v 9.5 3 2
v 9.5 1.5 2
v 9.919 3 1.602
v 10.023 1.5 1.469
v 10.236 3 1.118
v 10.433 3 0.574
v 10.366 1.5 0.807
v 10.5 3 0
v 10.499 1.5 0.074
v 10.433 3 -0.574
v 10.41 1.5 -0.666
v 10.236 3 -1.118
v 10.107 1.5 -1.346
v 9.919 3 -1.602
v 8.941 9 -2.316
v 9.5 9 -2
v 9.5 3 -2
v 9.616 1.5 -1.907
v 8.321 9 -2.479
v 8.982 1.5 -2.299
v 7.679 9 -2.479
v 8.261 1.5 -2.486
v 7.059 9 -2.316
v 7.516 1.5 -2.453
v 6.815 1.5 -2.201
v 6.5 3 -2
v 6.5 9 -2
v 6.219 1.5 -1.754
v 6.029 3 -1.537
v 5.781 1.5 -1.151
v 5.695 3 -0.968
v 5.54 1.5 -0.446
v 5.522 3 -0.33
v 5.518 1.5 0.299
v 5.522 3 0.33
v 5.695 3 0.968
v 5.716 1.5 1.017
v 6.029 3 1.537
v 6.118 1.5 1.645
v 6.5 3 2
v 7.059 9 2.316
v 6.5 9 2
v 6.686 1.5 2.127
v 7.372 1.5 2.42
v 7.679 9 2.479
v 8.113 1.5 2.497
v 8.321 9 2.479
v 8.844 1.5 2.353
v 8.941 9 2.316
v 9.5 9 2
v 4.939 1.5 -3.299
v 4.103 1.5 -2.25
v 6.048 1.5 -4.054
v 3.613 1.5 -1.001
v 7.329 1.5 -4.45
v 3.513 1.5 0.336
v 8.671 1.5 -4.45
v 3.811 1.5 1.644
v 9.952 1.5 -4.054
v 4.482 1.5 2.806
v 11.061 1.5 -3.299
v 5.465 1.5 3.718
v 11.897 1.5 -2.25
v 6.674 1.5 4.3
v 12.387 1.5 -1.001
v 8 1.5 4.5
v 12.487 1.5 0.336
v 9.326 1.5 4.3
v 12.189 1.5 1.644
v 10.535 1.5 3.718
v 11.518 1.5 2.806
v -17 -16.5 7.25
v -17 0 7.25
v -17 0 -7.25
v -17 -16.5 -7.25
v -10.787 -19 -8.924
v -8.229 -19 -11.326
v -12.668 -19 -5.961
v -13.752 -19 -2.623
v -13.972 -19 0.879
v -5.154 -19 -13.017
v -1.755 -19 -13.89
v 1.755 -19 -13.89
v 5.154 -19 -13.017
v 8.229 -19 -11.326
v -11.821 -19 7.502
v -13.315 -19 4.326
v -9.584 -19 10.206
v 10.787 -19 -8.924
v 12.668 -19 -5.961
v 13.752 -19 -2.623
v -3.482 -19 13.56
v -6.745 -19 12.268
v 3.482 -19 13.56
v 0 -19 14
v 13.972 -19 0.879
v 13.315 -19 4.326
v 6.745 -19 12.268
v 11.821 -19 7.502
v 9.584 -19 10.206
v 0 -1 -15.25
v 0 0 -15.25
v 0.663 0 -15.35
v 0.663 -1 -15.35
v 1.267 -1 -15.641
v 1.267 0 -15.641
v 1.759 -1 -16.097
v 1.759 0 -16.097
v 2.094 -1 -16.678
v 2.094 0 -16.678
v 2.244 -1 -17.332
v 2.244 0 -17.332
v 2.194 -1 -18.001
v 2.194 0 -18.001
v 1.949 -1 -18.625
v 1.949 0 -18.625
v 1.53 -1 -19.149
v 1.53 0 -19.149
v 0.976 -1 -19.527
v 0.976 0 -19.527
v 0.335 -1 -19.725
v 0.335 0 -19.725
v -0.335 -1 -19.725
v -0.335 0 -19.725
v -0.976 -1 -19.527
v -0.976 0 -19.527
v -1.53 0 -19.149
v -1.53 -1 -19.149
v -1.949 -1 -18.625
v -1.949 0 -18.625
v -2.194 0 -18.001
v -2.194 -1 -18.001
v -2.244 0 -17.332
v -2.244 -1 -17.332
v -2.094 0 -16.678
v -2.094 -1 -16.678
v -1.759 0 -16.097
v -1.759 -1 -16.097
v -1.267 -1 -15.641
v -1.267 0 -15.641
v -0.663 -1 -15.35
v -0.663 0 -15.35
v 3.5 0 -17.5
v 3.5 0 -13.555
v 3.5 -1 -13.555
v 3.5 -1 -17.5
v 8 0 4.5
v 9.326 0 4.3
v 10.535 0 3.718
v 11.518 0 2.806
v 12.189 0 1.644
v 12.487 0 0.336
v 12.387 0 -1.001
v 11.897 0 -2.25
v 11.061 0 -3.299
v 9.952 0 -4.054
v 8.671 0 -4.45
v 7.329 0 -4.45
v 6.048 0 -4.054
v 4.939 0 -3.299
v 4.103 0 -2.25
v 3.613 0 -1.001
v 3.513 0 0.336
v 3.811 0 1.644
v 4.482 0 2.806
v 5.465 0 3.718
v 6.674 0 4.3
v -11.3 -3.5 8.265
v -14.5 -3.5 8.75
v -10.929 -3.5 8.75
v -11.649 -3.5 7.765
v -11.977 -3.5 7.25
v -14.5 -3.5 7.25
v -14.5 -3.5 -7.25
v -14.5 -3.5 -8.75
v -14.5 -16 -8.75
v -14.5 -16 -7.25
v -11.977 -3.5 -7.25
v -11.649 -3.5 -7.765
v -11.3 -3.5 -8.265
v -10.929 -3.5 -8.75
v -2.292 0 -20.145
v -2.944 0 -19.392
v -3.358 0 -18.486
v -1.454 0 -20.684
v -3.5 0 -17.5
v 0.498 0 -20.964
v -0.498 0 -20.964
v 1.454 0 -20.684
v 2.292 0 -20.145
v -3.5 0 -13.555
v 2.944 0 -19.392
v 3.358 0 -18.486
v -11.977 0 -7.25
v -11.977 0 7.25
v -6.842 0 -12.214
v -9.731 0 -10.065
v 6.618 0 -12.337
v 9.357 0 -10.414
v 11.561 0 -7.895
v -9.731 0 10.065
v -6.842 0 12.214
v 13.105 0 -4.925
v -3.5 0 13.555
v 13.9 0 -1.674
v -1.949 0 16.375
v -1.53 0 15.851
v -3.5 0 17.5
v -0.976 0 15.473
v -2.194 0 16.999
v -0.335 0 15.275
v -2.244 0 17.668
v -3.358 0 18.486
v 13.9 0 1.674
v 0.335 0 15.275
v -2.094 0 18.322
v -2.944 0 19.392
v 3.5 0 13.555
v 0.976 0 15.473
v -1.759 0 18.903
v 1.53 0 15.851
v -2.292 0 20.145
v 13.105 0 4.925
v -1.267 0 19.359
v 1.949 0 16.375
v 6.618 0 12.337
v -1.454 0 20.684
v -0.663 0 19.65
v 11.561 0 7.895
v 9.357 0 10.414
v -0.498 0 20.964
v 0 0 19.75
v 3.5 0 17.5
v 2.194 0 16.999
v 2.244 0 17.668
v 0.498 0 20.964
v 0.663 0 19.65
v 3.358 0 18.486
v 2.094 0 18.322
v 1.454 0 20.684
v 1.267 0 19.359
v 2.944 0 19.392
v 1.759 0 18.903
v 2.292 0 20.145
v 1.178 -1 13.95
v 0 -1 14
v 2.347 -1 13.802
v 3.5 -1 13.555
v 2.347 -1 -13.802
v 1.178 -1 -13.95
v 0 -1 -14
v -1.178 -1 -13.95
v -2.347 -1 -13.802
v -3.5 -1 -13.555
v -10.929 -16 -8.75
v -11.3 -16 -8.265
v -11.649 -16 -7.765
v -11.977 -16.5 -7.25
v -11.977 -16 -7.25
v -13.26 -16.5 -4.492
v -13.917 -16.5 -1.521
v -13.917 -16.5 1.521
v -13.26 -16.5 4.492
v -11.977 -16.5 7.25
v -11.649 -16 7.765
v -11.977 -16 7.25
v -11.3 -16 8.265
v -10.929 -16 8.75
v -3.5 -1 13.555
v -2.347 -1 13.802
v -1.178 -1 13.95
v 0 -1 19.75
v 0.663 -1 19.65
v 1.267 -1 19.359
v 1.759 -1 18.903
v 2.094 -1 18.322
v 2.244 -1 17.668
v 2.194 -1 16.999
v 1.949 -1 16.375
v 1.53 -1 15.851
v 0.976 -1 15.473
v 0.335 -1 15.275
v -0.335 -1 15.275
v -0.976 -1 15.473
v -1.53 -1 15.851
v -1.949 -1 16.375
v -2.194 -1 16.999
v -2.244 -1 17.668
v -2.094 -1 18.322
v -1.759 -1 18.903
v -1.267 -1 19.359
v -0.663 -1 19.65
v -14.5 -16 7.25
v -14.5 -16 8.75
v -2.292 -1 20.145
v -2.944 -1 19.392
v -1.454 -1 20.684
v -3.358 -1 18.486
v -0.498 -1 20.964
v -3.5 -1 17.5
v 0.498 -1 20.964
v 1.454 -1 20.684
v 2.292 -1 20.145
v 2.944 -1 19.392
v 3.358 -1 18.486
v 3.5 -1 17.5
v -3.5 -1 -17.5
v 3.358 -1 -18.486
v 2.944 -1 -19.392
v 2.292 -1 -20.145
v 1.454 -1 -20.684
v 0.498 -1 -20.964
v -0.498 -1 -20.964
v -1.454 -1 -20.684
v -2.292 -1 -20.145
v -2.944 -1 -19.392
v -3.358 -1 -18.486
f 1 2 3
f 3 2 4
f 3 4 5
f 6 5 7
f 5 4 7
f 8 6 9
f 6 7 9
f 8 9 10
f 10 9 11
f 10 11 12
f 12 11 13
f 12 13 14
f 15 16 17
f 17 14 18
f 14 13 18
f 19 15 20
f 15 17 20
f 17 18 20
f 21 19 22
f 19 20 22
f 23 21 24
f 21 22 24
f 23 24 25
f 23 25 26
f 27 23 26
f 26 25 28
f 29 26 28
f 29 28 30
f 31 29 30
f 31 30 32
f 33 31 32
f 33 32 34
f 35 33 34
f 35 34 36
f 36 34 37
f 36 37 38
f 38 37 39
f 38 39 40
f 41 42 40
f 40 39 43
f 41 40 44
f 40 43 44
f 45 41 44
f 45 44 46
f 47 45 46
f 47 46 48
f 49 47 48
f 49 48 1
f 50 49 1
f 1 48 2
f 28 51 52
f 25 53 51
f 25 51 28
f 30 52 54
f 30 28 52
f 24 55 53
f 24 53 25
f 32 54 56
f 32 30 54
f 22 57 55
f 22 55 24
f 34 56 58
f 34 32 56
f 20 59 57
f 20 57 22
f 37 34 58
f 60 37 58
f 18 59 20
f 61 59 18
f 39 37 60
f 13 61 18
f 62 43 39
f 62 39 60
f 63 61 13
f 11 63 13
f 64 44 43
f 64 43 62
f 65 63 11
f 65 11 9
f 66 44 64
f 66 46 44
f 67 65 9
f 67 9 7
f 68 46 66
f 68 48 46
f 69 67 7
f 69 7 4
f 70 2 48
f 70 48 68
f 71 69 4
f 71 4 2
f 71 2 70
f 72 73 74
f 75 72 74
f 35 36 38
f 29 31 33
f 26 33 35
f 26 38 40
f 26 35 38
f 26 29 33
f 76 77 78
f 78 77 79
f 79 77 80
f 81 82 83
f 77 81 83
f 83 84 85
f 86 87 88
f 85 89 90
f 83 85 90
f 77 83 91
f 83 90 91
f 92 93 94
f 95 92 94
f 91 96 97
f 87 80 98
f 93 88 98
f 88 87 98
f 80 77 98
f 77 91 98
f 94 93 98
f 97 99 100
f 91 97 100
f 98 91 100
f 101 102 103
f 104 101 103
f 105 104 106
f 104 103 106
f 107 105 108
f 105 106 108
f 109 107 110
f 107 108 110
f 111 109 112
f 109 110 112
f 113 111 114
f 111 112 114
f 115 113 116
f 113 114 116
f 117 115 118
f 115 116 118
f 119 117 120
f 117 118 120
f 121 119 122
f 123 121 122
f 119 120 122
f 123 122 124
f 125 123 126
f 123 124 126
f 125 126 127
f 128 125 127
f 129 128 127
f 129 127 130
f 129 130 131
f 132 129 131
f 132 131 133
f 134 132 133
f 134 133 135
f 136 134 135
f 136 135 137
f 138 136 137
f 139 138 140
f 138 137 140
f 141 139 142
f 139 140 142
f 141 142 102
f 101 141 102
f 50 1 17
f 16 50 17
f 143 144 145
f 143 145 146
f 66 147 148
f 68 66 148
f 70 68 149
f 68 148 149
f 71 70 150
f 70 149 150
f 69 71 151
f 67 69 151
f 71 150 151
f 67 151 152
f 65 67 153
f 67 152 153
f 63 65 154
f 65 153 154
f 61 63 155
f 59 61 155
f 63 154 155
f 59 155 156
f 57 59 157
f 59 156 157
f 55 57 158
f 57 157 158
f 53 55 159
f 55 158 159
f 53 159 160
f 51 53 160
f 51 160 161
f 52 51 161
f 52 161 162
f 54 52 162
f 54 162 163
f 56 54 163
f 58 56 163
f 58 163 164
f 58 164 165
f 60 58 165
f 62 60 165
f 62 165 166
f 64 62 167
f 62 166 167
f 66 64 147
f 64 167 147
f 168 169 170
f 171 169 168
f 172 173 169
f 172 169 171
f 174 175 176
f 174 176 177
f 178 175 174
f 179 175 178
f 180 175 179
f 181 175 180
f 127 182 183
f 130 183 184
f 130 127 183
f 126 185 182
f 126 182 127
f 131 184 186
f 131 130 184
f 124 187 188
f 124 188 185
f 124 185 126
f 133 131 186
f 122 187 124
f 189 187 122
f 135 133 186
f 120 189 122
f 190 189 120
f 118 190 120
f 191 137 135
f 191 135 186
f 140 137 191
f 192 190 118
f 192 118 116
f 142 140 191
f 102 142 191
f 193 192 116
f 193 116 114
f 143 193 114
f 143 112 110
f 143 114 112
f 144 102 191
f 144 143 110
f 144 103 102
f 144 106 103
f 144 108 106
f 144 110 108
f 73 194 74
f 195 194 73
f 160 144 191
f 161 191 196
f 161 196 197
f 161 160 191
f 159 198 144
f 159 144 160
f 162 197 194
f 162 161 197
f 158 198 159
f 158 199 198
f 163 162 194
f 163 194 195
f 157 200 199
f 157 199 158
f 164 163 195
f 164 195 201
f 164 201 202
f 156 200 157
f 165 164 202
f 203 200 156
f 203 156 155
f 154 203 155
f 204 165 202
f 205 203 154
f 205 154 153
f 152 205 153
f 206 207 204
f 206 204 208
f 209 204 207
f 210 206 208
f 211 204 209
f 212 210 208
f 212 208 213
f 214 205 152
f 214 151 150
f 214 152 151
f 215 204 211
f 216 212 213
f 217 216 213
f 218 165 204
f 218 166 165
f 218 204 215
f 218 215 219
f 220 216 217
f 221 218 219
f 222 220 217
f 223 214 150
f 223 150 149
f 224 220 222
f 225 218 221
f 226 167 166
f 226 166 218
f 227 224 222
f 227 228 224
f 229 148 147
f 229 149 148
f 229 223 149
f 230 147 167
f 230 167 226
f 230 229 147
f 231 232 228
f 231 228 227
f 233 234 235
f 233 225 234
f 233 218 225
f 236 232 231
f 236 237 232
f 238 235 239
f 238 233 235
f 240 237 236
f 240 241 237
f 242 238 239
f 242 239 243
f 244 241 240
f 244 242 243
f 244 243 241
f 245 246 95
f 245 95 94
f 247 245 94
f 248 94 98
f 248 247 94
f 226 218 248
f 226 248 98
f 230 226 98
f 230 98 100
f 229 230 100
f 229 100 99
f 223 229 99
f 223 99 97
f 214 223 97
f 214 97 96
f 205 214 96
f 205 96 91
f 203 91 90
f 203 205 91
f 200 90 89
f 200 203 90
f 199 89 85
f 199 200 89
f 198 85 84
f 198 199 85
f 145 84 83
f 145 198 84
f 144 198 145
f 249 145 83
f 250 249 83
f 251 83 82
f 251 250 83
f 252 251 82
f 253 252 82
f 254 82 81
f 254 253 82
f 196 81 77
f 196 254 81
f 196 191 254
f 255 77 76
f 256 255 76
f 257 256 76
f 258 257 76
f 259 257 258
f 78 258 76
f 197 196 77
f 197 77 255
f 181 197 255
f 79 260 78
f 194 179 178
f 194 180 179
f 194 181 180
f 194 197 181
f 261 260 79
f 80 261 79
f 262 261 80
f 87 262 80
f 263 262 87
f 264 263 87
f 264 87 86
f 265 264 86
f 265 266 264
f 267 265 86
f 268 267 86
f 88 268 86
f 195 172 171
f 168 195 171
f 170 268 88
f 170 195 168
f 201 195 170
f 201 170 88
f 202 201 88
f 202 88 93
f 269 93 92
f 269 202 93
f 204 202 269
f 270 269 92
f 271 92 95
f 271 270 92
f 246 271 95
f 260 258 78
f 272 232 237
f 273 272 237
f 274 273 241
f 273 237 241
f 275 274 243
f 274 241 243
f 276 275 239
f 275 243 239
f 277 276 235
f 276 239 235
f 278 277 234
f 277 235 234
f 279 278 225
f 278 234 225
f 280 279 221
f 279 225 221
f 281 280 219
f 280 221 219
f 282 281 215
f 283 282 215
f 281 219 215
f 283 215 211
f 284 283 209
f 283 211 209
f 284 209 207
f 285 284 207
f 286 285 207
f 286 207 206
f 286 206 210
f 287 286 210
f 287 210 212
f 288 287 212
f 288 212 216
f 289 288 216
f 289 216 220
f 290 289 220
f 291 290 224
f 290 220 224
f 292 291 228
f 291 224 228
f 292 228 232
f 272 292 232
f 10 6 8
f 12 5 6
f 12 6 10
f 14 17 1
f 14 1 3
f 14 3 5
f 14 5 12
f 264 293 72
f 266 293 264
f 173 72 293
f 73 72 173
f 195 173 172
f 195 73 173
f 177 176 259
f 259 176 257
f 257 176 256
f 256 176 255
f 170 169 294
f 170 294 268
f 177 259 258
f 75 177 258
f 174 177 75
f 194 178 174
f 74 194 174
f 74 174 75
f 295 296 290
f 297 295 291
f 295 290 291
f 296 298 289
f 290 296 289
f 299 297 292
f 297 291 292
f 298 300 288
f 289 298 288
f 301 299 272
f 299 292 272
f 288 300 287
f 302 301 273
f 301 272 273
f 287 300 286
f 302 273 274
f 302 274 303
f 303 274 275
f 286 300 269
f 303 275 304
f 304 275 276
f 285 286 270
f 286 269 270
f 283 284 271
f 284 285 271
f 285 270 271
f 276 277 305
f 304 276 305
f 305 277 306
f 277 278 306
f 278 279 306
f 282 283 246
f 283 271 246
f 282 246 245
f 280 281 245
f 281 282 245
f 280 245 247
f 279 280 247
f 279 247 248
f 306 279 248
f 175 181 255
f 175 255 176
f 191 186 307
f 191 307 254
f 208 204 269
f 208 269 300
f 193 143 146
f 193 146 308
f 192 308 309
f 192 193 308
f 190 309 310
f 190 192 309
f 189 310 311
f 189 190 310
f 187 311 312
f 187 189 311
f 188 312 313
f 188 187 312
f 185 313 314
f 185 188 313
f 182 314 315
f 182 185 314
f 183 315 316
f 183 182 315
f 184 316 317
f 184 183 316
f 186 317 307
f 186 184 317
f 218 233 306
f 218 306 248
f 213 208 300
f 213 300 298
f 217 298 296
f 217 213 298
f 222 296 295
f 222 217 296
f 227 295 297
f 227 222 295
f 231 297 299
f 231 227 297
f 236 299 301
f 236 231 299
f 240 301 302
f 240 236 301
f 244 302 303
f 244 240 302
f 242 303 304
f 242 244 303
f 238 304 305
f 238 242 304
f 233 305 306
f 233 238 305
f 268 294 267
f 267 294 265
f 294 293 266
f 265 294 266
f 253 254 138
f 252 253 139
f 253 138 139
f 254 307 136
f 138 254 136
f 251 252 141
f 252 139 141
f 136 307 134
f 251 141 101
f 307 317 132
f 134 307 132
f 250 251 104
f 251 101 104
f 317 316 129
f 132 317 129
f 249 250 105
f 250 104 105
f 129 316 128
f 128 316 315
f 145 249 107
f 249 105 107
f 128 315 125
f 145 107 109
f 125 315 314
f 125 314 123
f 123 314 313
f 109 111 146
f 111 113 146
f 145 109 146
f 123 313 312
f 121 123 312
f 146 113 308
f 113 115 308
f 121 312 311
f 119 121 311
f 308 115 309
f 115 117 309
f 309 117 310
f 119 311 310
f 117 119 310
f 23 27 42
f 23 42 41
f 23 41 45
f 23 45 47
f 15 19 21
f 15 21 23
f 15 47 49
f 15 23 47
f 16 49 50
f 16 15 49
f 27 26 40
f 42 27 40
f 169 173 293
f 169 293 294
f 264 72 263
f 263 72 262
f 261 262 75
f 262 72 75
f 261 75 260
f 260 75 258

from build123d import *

# Parameters (mm, degrees)
EXTRUDE_1_DEPTH   = 9
EXTRUDE_2_DEPTH   = 3
EXTRUDE_3_DEPTH   = 1.5
SKETCH_1_7_R      = 2.25
EXTRUDE_4_DEPTH   = 1
EXTRUDE_4_2_DEPTH = 1
SKETCH_1_8_R      = 14
EXTRUDE_5_DEPTH   = 19
EXTRUDE_6_DEPTH   = 16.5
EXTRUDE_START     = -3.5
EXTRUDE_7_DEPTH   = 12.5


with BuildPart() as part:
    # Эскиз1 → Бобышка-Вытянуть1 (new body)
    with BuildSketch(Plane(origin=(0, 0, 0), x_dir=(1, 0, 0), z_dir=(0, 1, 0))):
        with BuildLine():
            ThreePointArc((9.5, 2), (8, 2.5), (6.5, 2))
            Line((6.5, 2), (6.5, -2))
            ThreePointArc((6.5, -2), (8, -2.5), (9.5, -2))
            Line((9.5, -2), (9.5, 2))
        make_face()
    extrude(amount=EXTRUDE_1_DEPTH)

    # Эскиз1<4> → Бобышка-Вытянуть2 (add)
    with BuildSketch(Plane(origin=(0, 0, 0), x_dir=(1, 0, 0), z_dir=(0, 1, 0))):
        with BuildLine():
            Line((6.5, -2), (6.5, 2))
            ThreePointArc((6.5, 2), (5.5, 0), (6.5, -2))
        make_face()
        with BuildLine():
            ThreePointArc((9.5, -2), (10.5, 0), (9.5, 2))
            Line((9.5, 2), (9.5, -2))
        make_face()
    extrude(amount=EXTRUDE_2_DEPTH)

    # Эскиз1<5> → Бобышка-Вытянуть3 (add)
    with BuildSketch(Plane(origin=(0, 0, 0), x_dir=(1, 0, 0), z_dir=(0, 1, 0))):
        with BuildLine():
            ThreePointArc((12.5, 0), (8.000000009, 4.5), (3.5, 1.8e-08))
            ThreePointArc((3.5, 1.8e-08), (7.999999991, -4.5), (12.5, 0))
        make_face()
        with BuildLine():
            ThreePointArc((6.5, -2), (5.5, 0), (6.5, 2))
            ThreePointArc((6.5, 2), (8, 2.5), (9.5, 2))
            ThreePointArc((9.5, 2), (10.236067977, 1.118033989), (10.5, 0))
            ThreePointArc((10.5, 0), (10.236067977, -1.118033989), (9.5, -2))
            ThreePointArc((9.5, -2), (8, -2.5), (6.5, -2))
        make_face(mode=Mode.SUBTRACT)
    extrude(amount=EXTRUDE_3_DEPTH)



with BuildPart() as body_2:
    # Эскиз1<7> → Бобышка-Вытянуть4 (new body)
    with BuildSketch(Plane(origin=(0, 0, 0), x_dir=(1, 0, 0), z_dir=(0, 1, 0))):
        with BuildLine():
            Line((-3.5, 17.5), (-3.5, 13.555441712))
            ThreePointArc((-3.5, 13.555441712), (0, 14), (3.5, 13.555441712))
            Line((3.5, 13.555441712), (3.5, 17.5))
            ThreePointArc((3.5, 17.5), (0, 21), (-3.5, 17.5))
        make_face()
        with Locations((0, 17.5)):
            Circle(SKETCH_1_7_R, mode=Mode.SUBTRACT)
    extrude(amount=-EXTRUDE_4_DEPTH)


with BuildPart() as body_3:
    # Эскиз1<7> → Extrude 4 2 (new body)
    with BuildSketch(Plane(origin=(0, 0, 0), x_dir=(1, 0, 0), z_dir=(0, 1, 0))):
        with BuildLine():
            Line((-3.5, -13.555441712), (-3.5, -17.5))
            ThreePointArc((-3.5, -17.5), (0, -21), (3.5, -17.5))
            Line((3.5, -17.5), (3.5, -13.555441712))
            ThreePointArc((3.5, -13.555441712), (0, -14), (-3.5, -13.555441712))
        make_face()
        with Locations((0, -17.5)):
            Circle(SKETCH_1_7_R, mode=Mode.SUBTRACT)
    extrude(amount=-EXTRUDE_4_2_DEPTH)


with BuildPart() as part_1:
    add(part.part)

    add(body_2.part)  # Бобышка-Вытянуть5 merges body 2

    add(body_3.part)  # Бобышка-Вытянуть5 merges body 3
    # Эскиз1<8> → Бобышка-Вытянуть5 (add)
    with BuildSketch(Plane(origin=(0, 0, 0), x_dir=(1, 0, 0), z_dir=(0, 1, 0))):
        Circle(SKETCH_1_8_R)
    extrude(amount=-EXTRUDE_5_DEPTH)

    # Эскиз1<9> → Бобышка-Вытянуть6 (add)
    with BuildSketch(Plane(origin=(0, 0, 0), x_dir=(1, 0, 0), z_dir=(0, 1, 0))):
        with BuildLine():
            ThreePointArc((-11.976539567, -7.25), (-14, 0), (-11.976539567, 7.25))
            Line((-11.976539567, 7.25), (-17, 7.25))
            Line((-17, 7.25), (-17, -7.25))
            Line((-17, -7.25), (-11.976539567, -7.25))
        make_face()
    extrude(amount=-EXTRUDE_6_DEPTH)

    # Эскиз1<10> → Бобышка-Вытянуть7 (add)
    with BuildSketch(Plane(origin=(0, 0, 0), x_dir=(1, 0, 0), z_dir=(0, 1, 0)).offset(EXTRUDE_START)):
        with BuildLine():
            ThreePointArc((-11.976539567, 7.25), (-11.477174409, 8.017135871), (-10.928746497, 8.75))
            Line((-10.928746497, 8.75), (-14.5, 8.75))
            Line((-14.5, 8.75), (-14.5, 7.25))
            Line((-14.5, 7.25), (-11.976539567, 7.25))
        make_face()
        with BuildLine():
            ThreePointArc((-10.928746497, -8.75), (-11.477174409, -8.017135871), (-11.976539567, -7.25))
            Line((-11.976539567, -7.25), (-14.5, -7.25))
            Line((-14.5, -7.25), (-14.5, -8.75))
            Line((-14.5, -8.75), (-10.928746497, -8.75))
        make_face()
    extrude(amount=-EXTRUDE_7_DEPTH)


solid = part_1.part
